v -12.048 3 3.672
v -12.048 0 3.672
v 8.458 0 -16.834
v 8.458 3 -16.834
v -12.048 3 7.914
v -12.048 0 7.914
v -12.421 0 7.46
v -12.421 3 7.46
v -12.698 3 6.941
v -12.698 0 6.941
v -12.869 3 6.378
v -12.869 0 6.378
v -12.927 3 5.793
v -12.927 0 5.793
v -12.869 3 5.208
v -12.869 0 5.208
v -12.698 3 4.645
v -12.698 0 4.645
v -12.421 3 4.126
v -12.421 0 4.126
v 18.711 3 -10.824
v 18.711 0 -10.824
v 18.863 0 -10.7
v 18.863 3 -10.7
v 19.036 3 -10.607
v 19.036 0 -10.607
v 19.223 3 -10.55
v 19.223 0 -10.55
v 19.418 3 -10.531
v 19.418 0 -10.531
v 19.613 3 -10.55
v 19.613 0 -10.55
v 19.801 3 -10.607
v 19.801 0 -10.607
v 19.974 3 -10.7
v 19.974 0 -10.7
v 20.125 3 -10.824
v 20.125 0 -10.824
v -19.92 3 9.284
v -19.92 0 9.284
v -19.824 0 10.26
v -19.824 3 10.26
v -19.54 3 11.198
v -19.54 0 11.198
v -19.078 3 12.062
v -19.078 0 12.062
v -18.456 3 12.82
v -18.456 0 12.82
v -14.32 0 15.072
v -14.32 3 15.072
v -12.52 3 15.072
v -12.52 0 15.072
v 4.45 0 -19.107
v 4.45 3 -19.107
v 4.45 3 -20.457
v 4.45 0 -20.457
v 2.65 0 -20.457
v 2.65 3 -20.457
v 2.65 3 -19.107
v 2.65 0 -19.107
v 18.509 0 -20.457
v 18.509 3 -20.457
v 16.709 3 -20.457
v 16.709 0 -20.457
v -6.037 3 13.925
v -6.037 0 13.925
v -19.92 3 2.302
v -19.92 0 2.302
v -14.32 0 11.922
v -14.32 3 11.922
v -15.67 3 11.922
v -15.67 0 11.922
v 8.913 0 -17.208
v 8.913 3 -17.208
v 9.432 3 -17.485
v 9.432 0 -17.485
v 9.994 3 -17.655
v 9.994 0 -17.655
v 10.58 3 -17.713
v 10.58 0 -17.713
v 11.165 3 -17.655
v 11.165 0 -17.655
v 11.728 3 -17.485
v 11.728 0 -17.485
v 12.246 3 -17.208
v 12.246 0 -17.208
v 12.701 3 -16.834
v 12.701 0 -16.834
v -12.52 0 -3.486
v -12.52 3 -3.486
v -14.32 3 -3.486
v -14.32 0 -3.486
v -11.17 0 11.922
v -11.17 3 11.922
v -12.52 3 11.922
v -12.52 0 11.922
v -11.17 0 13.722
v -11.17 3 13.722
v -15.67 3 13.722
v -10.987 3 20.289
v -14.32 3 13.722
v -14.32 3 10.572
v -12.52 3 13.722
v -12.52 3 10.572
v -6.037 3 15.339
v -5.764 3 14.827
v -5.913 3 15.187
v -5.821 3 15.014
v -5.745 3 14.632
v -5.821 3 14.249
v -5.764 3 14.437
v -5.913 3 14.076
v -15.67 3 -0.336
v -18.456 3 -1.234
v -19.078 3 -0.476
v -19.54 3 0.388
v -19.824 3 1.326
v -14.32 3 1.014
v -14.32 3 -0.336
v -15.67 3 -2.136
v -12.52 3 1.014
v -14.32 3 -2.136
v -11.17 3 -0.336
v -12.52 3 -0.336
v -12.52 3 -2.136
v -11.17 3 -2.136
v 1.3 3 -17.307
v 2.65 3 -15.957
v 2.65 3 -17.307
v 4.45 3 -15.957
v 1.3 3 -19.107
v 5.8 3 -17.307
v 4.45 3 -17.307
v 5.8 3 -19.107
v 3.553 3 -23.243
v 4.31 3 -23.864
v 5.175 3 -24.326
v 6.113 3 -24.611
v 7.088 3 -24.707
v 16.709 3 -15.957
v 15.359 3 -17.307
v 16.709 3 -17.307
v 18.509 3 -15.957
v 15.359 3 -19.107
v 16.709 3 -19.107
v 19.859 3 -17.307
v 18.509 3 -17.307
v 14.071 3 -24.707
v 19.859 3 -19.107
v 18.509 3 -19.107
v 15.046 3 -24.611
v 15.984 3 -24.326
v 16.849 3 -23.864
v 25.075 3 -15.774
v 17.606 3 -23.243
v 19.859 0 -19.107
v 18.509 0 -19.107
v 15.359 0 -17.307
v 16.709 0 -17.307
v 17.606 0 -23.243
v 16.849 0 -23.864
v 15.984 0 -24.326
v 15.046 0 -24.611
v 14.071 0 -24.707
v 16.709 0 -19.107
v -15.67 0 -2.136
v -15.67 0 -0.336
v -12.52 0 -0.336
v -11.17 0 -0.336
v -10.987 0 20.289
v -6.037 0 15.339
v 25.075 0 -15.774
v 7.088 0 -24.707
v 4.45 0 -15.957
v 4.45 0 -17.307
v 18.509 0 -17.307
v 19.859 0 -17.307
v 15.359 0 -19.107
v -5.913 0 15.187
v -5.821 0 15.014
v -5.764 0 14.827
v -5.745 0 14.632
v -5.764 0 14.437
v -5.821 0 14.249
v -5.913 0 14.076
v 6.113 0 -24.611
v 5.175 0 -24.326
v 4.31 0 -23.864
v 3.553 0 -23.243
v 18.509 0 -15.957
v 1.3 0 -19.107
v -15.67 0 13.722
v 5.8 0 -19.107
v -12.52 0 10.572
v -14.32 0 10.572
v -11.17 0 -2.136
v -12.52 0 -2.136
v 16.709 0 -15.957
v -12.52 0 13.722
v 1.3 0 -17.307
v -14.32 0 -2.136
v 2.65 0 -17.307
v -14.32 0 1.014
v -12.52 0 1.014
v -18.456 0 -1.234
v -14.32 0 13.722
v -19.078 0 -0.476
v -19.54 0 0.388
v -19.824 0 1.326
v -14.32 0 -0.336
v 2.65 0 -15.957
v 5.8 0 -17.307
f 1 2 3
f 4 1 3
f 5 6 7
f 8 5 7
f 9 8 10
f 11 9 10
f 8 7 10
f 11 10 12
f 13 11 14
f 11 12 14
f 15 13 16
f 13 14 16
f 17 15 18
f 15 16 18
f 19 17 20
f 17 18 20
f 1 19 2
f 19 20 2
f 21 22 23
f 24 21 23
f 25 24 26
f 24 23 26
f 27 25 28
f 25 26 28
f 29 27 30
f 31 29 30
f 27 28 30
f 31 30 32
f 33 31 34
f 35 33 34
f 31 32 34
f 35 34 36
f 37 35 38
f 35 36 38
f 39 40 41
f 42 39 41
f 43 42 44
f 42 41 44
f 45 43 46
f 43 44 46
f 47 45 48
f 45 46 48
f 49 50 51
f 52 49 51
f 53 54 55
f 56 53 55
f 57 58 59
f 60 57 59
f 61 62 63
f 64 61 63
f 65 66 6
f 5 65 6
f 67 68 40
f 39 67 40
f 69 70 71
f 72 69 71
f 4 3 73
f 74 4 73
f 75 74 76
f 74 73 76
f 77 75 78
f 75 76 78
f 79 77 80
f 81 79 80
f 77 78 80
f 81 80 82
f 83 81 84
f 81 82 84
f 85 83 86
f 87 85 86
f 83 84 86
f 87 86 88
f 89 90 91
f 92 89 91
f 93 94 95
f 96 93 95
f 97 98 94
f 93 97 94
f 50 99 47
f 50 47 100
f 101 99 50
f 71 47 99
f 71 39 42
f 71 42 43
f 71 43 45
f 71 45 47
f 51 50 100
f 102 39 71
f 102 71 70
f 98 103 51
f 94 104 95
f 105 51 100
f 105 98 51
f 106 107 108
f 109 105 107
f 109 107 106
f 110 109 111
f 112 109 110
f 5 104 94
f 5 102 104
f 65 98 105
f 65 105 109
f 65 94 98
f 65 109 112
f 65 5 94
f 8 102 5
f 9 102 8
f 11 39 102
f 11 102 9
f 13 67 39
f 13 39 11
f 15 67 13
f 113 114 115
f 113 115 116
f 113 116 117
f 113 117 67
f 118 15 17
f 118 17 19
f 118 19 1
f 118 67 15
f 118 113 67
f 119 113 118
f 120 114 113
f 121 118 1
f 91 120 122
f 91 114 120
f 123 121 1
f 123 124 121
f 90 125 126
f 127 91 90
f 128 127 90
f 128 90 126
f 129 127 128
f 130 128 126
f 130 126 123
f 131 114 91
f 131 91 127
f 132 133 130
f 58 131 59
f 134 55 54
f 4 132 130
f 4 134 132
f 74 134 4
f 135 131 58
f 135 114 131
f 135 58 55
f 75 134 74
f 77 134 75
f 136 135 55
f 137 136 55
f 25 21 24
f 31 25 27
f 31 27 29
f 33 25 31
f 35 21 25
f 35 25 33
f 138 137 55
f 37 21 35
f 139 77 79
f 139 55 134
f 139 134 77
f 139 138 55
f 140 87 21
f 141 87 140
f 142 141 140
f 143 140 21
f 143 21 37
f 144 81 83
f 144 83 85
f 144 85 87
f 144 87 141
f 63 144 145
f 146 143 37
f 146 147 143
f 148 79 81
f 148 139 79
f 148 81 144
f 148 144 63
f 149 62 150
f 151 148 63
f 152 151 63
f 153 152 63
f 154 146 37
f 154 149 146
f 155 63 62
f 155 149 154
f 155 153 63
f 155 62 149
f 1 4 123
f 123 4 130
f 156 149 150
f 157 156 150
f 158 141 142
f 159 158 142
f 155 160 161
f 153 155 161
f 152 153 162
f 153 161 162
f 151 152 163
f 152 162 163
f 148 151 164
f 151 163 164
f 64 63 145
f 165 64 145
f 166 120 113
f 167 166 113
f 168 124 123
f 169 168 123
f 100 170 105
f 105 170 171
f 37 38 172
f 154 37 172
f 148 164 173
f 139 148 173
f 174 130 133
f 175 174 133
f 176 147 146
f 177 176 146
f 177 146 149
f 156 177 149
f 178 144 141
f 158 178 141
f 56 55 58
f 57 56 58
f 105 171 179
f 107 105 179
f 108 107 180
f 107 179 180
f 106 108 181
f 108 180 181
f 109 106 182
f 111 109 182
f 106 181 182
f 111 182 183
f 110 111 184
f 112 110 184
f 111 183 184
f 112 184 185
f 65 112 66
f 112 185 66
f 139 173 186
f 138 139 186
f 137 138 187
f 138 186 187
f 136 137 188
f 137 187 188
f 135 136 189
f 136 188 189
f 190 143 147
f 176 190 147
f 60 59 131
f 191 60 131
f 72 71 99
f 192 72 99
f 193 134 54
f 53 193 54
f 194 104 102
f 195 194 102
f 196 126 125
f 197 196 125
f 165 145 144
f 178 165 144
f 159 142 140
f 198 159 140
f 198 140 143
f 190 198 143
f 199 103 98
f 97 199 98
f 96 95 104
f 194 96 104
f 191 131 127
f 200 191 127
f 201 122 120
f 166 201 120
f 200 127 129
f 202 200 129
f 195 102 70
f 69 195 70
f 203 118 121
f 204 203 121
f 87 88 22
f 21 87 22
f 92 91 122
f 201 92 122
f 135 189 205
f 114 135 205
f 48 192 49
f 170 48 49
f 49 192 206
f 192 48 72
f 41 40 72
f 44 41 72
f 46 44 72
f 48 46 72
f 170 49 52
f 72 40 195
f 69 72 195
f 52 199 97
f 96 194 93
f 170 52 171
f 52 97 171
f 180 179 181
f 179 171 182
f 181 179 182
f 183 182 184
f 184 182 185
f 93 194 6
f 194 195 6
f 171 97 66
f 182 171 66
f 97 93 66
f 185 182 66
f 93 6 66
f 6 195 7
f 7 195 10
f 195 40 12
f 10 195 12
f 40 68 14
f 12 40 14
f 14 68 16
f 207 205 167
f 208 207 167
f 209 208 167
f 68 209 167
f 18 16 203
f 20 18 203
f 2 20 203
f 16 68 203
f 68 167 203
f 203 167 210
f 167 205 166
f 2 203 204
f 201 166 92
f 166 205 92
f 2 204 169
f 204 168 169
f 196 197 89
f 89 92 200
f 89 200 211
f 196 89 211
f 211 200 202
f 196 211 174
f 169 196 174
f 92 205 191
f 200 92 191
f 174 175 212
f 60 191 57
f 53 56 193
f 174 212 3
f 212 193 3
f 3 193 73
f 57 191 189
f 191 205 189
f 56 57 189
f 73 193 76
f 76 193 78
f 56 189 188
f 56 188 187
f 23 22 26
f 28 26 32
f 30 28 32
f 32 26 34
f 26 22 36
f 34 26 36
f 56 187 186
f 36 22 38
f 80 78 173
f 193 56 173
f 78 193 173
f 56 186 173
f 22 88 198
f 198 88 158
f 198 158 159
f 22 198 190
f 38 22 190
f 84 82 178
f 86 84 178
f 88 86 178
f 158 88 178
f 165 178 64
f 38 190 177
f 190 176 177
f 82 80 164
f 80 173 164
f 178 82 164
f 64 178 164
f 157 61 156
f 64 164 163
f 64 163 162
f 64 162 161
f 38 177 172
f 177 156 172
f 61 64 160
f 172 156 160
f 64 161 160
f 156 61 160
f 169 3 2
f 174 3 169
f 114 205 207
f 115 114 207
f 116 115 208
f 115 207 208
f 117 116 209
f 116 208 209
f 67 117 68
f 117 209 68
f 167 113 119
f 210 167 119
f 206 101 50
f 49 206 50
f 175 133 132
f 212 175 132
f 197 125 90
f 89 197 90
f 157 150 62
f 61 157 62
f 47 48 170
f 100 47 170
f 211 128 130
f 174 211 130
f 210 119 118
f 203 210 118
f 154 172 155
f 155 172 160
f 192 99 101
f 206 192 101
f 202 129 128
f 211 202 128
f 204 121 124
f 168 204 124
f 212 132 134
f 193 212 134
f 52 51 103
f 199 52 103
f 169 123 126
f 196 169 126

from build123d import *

# Parameters (mm, degrees)
BOSS_EXTRUDE1_DEPTH = 3
CUT_EXTRUDE1_DEPTH  = 4


with BuildPart() as part:
    # Sketch1 → Boss-Extrude1 (new body)
    with BuildSketch(Plane(origin=(0, 0, 0), x_dir=(1, 0, 0), z_dir=(0, 1, 0))):
        with BuildLine():
            Line((-6.037453791, -13.924683413), (-12.047861431, -7.914275773))
            ThreePointArc((-12.047861431, -7.914275773), (-12.926541087, -5.792955429), (-12.047861431, -3.671635086))
            Line((-12.047861431, -3.671635086), (8.458235223, 16.834461569))
            ThreePointArc((8.458235223, 16.834461569), (10.579555567, 17.713141225), (12.700875911, 16.834461569))
            Line((12.700875911, 16.834461569), (18.711283551, 10.824053929))
            ThreePointArc((18.711283551, 10.824053929), (19.418390332, 10.53116071), (20.125497113, 10.824053929))
            Line((20.125497113, 10.824053929), (25.075244581, 15.773801397))
            Line((25.075244581, 15.773801397), (17.606467502, 23.242578477))
            ThreePointArc((17.606467502, 23.242578477), (15.984350757, 24.326442233), (14.070933596, 24.707044571))
            Line((14.070933596, 24.707044571), (7.088177538, 24.707044571))
            ThreePointArc((7.088177538, 24.707044571), (5.174760376, 24.326442233), (3.552643632, 23.242578477))
            Line((3.552643632, 23.242578477), (-18.455978339, 1.233956505))
            ThreePointArc((-18.455978339, 1.233956505), (-19.539842096, -0.388160239), (-19.920444433, -2.301577401))
            Line((-19.920444433, -2.301577401), (-19.920444433, -9.284333458))
            ThreePointArc((-19.920444433, -9.284333458), (-19.539842096, -11.19775062), (-18.455978339, -12.819867364))
            Line((-18.455978339, -12.819867364), (-10.987201259, -20.288644444))
            Line((-10.987201259, -20.288644444), (-6.037453791, -15.338896975))
            ThreePointArc((-6.037453791, -15.338896975), (-5.744560572, -14.631790194), (-6.037453791, -13.924683413))
        make_face()
    extrude(amount=BOSS_EXTRUDE1_DEPTH)

    # Sketch2 → Cut-Extrude1 (cut, through all)
    with BuildSketch(Plane(origin=(0, 3, 0), x_dir=(1, 0, 0), z_dir=(0, 1, 0))):
        Polygon((-15.670444433, 2.136481822), (-15.670444433, 0.336481822), (-14.320444433, 0.336481822), (-14.320444433, -1.013518178), (-12.520444433, -1.013518178), (-12.520444433, 0.336481822), (-11.170444433, 0.336481822), (-11.170444433, 2.136481822), (-12.520444433, 2.136481822), (-12.520444433, 3.486481822), (-14.320444433, 3.486481822), (-14.320444433, 2.136481822), align=None)
        Polygon((-12.520444433, -10.572392681), (-14.320444433, -10.572392681), (-14.320444433, -11.922392681), (-15.670444433, -11.922392681), (-15.670444433, -13.722392681), (-14.320444433, -13.722392681), (-14.320444433, -15.072392681), (-12.520444433, -15.072392681), (-12.520444433, -13.722392681), (-11.170444433, -13.722392681), (-11.170444433, -11.922392681), (-12.520444433, -11.922392681), align=None)
        Polygon((18.508992818, 17.307044571), (19.858992818, 17.307044571), (19.858992818, 19.107044571), (18.508992818, 19.107044571), (18.508992818, 20.457044571), (16.708992818, 20.457044571), (16.708992818, 19.107044571), (15.358992818, 19.107044571), (15.358992818, 17.307044571), (16.708992818, 17.307044571), (16.708992818, 15.957044571), (18.508992818, 15.957044571), align=None)
        Polygon((36.829555567, -13.722392681), (36.829555567, -11.922392681), (35.479555567, -11.922392681), (35.479555567, -10.572392681), (33.679555567, -10.572392681), (33.679555567, -11.922392681), (32.329555567, -11.922392681), (32.329555567, -13.722392681), (33.679555567, -13.722392681), (33.679555567, -15.072392681), (35.479555567, -15.072392681), (35.479555567, -13.722392681), align=None)
        Polygon((5.800118315, 19.107044571), (4.450118315, 19.107044571), (4.450118315, 20.457044571), (2.650118315, 20.457044571), (2.650118315, 19.107044571), (1.300118315, 19.107044571), (1.300118315, 17.307044571), (2.650118315, 17.307044571), (2.650118315, 15.957044571), (4.450118315, 15.957044571), (4.450118315, 17.307044571), (5.800118315, 17.307044571), align=None)
        Polygon((36.829555567, 2.136481822), (35.479555567, 2.136481822), (35.479555567, 3.486481822), (33.679555567, 3.486481822), (33.679555567, 2.136481822), (32.329555567, 2.136481822), (32.329555567, 0.336481822), (33.679555567, 0.336481822), (33.679555567, -1.013518178), (35.479555567, -1.013518178), (35.479555567, 0.336481822), (36.829555567, 0.336481822), align=None)
        Polygon((4.450118315, -32.042955429), (4.450118315, -30.692955429), (5.800118315, -30.692955429), (5.800118315, -28.892955429), (4.450118315, -28.892955429), (4.450118315, -27.542955429), (2.650118315, -27.542955429), (2.650118315, -28.892955429), (1.300118315, -28.892955429), (1.300118315, -30.692955429), (2.650118315, -30.692955429), (2.650118315, -32.042955429), align=None)
        Polygon((18.508992818, -32.042955429), (18.508992818, -30.692955429), (19.858992818, -30.692955429), (19.858992818, -28.892955429), (18.508992818, -28.892955429), (18.508992818, -27.542955429), (16.708992818, -27.542955429), (16.708992818, -28.892955429), (15.358992818, -28.892955429), (15.358992818, -30.692955429), (16.708992818, -30.692955429), (16.708992818, -32.042955429), align=None)
    extrude(amount=-CUT_EXTRUDE1_DEPTH, mode=Mode.SUBTRACT)


solid = part.part
